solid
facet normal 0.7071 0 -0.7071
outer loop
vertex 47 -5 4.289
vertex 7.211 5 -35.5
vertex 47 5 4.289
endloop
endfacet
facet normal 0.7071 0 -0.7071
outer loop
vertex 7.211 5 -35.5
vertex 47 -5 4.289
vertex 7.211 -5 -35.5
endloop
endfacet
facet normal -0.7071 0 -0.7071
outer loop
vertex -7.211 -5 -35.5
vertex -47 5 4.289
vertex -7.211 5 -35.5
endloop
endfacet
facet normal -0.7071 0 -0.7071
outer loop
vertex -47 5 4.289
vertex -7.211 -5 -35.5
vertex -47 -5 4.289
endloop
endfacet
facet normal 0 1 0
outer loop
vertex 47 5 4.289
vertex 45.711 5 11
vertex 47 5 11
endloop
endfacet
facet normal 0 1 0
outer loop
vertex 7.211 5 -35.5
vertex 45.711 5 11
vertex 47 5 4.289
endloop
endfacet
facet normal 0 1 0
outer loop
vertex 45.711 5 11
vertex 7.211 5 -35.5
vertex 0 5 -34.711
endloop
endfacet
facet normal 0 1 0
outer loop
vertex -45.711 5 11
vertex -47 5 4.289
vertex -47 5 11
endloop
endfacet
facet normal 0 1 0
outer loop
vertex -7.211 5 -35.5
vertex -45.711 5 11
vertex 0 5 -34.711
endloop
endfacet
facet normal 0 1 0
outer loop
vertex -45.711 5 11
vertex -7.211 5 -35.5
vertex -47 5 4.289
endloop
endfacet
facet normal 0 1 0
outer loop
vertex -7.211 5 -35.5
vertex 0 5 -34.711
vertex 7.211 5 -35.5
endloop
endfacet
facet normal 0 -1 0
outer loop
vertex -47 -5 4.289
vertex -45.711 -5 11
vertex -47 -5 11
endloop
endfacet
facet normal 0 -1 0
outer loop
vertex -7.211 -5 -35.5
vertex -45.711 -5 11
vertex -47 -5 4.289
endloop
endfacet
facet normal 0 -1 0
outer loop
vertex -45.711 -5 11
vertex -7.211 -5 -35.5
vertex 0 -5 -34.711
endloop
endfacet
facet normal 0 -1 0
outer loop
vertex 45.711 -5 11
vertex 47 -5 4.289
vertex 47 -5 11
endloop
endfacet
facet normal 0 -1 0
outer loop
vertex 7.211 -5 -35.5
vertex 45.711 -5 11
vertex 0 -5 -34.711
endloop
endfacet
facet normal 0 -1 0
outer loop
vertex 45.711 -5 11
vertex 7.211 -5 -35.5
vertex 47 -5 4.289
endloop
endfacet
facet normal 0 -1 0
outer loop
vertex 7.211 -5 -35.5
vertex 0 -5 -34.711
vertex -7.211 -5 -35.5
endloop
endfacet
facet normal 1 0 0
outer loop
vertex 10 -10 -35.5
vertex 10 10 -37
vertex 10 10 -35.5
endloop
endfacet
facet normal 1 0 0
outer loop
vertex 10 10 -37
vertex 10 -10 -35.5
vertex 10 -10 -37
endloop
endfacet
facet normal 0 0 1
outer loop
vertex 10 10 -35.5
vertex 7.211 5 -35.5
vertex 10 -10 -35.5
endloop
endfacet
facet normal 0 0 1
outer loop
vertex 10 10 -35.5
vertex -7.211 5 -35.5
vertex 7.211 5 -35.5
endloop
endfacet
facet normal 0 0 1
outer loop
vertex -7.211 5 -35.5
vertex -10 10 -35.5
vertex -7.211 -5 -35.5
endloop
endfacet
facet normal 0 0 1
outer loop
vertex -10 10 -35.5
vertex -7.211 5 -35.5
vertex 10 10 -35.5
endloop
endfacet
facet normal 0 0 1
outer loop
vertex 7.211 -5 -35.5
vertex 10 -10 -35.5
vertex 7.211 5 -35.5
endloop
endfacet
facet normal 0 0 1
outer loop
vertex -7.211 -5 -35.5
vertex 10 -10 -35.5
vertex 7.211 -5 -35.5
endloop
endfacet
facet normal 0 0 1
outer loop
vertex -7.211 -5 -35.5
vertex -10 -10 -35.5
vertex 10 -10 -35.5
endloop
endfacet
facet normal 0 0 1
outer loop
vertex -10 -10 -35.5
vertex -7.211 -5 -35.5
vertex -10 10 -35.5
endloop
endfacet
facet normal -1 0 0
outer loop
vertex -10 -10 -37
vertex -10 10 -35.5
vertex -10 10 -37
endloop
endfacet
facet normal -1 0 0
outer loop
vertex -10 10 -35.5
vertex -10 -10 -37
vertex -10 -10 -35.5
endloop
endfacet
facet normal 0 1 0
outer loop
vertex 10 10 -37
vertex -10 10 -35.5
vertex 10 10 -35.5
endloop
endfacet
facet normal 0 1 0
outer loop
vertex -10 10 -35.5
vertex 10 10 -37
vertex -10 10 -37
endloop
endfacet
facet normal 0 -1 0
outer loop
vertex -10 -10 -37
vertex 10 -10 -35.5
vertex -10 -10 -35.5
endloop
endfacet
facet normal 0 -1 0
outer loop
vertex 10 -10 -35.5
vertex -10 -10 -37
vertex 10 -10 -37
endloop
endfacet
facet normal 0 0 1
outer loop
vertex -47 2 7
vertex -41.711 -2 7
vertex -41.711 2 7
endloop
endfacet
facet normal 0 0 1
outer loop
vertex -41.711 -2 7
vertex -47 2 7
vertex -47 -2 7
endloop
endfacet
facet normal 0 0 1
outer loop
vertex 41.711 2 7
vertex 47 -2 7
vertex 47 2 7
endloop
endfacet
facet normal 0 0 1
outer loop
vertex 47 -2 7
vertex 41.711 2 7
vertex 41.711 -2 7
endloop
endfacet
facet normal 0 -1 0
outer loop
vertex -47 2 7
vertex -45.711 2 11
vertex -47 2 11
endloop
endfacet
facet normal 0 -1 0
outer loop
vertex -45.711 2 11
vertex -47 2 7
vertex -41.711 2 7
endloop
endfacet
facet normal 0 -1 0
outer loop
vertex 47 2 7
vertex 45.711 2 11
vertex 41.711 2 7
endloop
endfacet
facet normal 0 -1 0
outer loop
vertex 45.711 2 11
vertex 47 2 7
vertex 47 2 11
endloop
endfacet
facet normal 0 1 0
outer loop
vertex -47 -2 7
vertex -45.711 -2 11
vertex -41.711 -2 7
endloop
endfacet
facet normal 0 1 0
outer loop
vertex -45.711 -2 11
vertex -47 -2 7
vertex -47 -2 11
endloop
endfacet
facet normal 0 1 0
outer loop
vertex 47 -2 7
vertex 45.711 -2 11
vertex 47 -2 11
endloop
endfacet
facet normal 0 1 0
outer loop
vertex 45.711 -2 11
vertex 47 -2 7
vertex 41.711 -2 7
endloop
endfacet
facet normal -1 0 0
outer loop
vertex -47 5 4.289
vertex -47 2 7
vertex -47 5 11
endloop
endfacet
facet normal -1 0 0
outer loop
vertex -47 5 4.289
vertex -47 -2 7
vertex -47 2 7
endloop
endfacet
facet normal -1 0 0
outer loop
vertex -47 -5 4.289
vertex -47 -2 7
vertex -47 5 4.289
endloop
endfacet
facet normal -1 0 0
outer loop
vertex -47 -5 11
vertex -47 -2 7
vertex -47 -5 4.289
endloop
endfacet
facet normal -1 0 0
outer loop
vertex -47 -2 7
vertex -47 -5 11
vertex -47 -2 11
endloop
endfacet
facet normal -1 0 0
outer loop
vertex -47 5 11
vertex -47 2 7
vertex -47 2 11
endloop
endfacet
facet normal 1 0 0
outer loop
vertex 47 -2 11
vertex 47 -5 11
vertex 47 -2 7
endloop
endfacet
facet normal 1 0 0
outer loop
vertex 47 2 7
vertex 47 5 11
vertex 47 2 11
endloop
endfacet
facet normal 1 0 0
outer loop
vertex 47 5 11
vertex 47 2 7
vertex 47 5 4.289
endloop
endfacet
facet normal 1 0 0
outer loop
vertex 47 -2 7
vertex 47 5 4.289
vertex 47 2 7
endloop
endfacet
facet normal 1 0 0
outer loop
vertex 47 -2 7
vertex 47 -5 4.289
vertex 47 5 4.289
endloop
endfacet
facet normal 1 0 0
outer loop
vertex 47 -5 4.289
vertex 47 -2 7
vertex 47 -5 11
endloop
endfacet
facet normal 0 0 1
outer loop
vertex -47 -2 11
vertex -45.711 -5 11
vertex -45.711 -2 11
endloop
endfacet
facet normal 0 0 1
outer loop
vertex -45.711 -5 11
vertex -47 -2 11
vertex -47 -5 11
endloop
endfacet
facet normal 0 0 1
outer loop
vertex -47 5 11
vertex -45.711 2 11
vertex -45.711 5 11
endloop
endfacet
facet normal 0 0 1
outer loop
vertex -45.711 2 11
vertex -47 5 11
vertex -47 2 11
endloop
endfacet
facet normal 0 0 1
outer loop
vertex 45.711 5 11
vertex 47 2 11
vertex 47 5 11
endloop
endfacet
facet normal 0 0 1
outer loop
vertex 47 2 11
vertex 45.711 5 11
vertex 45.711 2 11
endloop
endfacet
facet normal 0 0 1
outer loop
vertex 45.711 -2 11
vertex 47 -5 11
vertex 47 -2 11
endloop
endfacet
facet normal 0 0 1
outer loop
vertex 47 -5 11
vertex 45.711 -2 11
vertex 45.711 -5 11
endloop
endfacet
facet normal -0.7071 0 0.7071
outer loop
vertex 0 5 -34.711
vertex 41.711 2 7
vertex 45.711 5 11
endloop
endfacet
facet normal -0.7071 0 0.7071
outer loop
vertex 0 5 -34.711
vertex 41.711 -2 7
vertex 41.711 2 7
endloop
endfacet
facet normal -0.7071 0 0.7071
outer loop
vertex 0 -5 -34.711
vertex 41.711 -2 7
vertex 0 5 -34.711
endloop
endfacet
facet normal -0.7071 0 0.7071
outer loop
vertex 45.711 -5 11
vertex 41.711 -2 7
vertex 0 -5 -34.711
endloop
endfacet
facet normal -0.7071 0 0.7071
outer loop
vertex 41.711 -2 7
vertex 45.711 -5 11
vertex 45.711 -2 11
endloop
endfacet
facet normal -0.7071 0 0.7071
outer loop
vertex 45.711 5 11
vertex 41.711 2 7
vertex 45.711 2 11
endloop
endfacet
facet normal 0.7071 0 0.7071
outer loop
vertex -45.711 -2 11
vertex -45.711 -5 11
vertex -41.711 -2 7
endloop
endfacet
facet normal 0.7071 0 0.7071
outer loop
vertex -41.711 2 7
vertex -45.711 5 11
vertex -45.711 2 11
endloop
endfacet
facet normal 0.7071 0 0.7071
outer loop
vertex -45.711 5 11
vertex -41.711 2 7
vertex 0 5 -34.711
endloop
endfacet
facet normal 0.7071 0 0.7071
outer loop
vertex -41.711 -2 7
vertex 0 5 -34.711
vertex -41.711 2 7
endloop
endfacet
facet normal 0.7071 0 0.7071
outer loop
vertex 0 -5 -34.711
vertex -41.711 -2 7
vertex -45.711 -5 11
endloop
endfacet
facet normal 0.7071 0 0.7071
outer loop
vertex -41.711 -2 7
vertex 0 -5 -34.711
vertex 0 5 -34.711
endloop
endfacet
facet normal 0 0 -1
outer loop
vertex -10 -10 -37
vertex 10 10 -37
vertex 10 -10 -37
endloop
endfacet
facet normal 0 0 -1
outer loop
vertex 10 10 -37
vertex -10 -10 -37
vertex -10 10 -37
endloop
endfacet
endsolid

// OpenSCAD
module 9g_motor(){
	difference(){			
		union(){
			color("steel blue") cube([23,12.5,22], center=true);
			color("steel blue") translate([0,0,5]) cube([32,12,2], center=true);
			color("steel blue") translate([5.5,0,2.75]) cylinder(r=6, h=25.75, $fn=20, center=true);
			color("steel blue") translate([-.5,0,2.75]) cylinder(r=1, h=25.75, $fn=20, center=true);
			color("steel blue") translate([-1,0,2.75]) cube([5,5.6,24.5], center=true);		
			color("white") translate([5.5,0,3.65]) cylinder(r=2.35, h=29.25, $fn=20, center=true);				
		}
		translate([10,0,-11]) rotate([0,-30,0]) cube([8,13,4], center=true);
		for ( hole = [14,-14] ){
			translate([hole,0,5]) cylinder(r=2.2, h=4, $fn=20, center=true);
		}	
	}
}



//rotate([0,90,0]) 9g_motor();

//keep
difference() {

union() {

// arms
translate([0,0,28]) rotate([0,45,0]) cube([100,10,100], true);

// platform
translate([0,0,-37]) cube([20,20,3], true);


}
// remove

// main groove
translate([0,0,12]) cube([100,4,10], true);

// end bits
translate([-55,0,10]) cube([16,16,16], true);
translate([55,0,10]) cube([16,16,16], true);

// flatten top
translate([0,0,31]) cube([200,100,40], true);

// v cutaway
translate([0,0,36]) rotate([0,45,0]) cube([100,12,100], true);

// flat bottom
translate([0,0,-42]) cube([32,32,10], true);

}





// Draws a ruler of specified length.
// Origin of the ruler is at 0, and it is laid out along the X axis.
// Call with: ruler(length);
module ruler(length){
    difference(){
        //draw ruler
        union(){
            offset=0;
            for(n=[1:4]){
                offset=pow(2,n+1)-2;
                translate([0,-offset,0])
                drawscale(length,pow(10,n-1),pow(2,n));
            }
        }
        //cut of protruding end bits
        color([0,0,0])
        translate([length,-38,-1])
        cube([1000,38,3]);
    }
}

//Draws the different scales, as needed. Don't call directly.
module drawscale(length,step,width){
    if(length>step){    
        for(n=[0:step:length-1]){
            if(n%(2*step)==0){
                 color([0,0,0])
                 translate([n,0,0])
                 cube([step,width,1]);  
            }else{
                 color([1,1,1])
                 translate([n,0,0])
                 cube([step,width,1]);  
            }
        }
    }
}

//Test
//rotate([0,0,0]) translate([-29,-2,-5]) ruler(200);
